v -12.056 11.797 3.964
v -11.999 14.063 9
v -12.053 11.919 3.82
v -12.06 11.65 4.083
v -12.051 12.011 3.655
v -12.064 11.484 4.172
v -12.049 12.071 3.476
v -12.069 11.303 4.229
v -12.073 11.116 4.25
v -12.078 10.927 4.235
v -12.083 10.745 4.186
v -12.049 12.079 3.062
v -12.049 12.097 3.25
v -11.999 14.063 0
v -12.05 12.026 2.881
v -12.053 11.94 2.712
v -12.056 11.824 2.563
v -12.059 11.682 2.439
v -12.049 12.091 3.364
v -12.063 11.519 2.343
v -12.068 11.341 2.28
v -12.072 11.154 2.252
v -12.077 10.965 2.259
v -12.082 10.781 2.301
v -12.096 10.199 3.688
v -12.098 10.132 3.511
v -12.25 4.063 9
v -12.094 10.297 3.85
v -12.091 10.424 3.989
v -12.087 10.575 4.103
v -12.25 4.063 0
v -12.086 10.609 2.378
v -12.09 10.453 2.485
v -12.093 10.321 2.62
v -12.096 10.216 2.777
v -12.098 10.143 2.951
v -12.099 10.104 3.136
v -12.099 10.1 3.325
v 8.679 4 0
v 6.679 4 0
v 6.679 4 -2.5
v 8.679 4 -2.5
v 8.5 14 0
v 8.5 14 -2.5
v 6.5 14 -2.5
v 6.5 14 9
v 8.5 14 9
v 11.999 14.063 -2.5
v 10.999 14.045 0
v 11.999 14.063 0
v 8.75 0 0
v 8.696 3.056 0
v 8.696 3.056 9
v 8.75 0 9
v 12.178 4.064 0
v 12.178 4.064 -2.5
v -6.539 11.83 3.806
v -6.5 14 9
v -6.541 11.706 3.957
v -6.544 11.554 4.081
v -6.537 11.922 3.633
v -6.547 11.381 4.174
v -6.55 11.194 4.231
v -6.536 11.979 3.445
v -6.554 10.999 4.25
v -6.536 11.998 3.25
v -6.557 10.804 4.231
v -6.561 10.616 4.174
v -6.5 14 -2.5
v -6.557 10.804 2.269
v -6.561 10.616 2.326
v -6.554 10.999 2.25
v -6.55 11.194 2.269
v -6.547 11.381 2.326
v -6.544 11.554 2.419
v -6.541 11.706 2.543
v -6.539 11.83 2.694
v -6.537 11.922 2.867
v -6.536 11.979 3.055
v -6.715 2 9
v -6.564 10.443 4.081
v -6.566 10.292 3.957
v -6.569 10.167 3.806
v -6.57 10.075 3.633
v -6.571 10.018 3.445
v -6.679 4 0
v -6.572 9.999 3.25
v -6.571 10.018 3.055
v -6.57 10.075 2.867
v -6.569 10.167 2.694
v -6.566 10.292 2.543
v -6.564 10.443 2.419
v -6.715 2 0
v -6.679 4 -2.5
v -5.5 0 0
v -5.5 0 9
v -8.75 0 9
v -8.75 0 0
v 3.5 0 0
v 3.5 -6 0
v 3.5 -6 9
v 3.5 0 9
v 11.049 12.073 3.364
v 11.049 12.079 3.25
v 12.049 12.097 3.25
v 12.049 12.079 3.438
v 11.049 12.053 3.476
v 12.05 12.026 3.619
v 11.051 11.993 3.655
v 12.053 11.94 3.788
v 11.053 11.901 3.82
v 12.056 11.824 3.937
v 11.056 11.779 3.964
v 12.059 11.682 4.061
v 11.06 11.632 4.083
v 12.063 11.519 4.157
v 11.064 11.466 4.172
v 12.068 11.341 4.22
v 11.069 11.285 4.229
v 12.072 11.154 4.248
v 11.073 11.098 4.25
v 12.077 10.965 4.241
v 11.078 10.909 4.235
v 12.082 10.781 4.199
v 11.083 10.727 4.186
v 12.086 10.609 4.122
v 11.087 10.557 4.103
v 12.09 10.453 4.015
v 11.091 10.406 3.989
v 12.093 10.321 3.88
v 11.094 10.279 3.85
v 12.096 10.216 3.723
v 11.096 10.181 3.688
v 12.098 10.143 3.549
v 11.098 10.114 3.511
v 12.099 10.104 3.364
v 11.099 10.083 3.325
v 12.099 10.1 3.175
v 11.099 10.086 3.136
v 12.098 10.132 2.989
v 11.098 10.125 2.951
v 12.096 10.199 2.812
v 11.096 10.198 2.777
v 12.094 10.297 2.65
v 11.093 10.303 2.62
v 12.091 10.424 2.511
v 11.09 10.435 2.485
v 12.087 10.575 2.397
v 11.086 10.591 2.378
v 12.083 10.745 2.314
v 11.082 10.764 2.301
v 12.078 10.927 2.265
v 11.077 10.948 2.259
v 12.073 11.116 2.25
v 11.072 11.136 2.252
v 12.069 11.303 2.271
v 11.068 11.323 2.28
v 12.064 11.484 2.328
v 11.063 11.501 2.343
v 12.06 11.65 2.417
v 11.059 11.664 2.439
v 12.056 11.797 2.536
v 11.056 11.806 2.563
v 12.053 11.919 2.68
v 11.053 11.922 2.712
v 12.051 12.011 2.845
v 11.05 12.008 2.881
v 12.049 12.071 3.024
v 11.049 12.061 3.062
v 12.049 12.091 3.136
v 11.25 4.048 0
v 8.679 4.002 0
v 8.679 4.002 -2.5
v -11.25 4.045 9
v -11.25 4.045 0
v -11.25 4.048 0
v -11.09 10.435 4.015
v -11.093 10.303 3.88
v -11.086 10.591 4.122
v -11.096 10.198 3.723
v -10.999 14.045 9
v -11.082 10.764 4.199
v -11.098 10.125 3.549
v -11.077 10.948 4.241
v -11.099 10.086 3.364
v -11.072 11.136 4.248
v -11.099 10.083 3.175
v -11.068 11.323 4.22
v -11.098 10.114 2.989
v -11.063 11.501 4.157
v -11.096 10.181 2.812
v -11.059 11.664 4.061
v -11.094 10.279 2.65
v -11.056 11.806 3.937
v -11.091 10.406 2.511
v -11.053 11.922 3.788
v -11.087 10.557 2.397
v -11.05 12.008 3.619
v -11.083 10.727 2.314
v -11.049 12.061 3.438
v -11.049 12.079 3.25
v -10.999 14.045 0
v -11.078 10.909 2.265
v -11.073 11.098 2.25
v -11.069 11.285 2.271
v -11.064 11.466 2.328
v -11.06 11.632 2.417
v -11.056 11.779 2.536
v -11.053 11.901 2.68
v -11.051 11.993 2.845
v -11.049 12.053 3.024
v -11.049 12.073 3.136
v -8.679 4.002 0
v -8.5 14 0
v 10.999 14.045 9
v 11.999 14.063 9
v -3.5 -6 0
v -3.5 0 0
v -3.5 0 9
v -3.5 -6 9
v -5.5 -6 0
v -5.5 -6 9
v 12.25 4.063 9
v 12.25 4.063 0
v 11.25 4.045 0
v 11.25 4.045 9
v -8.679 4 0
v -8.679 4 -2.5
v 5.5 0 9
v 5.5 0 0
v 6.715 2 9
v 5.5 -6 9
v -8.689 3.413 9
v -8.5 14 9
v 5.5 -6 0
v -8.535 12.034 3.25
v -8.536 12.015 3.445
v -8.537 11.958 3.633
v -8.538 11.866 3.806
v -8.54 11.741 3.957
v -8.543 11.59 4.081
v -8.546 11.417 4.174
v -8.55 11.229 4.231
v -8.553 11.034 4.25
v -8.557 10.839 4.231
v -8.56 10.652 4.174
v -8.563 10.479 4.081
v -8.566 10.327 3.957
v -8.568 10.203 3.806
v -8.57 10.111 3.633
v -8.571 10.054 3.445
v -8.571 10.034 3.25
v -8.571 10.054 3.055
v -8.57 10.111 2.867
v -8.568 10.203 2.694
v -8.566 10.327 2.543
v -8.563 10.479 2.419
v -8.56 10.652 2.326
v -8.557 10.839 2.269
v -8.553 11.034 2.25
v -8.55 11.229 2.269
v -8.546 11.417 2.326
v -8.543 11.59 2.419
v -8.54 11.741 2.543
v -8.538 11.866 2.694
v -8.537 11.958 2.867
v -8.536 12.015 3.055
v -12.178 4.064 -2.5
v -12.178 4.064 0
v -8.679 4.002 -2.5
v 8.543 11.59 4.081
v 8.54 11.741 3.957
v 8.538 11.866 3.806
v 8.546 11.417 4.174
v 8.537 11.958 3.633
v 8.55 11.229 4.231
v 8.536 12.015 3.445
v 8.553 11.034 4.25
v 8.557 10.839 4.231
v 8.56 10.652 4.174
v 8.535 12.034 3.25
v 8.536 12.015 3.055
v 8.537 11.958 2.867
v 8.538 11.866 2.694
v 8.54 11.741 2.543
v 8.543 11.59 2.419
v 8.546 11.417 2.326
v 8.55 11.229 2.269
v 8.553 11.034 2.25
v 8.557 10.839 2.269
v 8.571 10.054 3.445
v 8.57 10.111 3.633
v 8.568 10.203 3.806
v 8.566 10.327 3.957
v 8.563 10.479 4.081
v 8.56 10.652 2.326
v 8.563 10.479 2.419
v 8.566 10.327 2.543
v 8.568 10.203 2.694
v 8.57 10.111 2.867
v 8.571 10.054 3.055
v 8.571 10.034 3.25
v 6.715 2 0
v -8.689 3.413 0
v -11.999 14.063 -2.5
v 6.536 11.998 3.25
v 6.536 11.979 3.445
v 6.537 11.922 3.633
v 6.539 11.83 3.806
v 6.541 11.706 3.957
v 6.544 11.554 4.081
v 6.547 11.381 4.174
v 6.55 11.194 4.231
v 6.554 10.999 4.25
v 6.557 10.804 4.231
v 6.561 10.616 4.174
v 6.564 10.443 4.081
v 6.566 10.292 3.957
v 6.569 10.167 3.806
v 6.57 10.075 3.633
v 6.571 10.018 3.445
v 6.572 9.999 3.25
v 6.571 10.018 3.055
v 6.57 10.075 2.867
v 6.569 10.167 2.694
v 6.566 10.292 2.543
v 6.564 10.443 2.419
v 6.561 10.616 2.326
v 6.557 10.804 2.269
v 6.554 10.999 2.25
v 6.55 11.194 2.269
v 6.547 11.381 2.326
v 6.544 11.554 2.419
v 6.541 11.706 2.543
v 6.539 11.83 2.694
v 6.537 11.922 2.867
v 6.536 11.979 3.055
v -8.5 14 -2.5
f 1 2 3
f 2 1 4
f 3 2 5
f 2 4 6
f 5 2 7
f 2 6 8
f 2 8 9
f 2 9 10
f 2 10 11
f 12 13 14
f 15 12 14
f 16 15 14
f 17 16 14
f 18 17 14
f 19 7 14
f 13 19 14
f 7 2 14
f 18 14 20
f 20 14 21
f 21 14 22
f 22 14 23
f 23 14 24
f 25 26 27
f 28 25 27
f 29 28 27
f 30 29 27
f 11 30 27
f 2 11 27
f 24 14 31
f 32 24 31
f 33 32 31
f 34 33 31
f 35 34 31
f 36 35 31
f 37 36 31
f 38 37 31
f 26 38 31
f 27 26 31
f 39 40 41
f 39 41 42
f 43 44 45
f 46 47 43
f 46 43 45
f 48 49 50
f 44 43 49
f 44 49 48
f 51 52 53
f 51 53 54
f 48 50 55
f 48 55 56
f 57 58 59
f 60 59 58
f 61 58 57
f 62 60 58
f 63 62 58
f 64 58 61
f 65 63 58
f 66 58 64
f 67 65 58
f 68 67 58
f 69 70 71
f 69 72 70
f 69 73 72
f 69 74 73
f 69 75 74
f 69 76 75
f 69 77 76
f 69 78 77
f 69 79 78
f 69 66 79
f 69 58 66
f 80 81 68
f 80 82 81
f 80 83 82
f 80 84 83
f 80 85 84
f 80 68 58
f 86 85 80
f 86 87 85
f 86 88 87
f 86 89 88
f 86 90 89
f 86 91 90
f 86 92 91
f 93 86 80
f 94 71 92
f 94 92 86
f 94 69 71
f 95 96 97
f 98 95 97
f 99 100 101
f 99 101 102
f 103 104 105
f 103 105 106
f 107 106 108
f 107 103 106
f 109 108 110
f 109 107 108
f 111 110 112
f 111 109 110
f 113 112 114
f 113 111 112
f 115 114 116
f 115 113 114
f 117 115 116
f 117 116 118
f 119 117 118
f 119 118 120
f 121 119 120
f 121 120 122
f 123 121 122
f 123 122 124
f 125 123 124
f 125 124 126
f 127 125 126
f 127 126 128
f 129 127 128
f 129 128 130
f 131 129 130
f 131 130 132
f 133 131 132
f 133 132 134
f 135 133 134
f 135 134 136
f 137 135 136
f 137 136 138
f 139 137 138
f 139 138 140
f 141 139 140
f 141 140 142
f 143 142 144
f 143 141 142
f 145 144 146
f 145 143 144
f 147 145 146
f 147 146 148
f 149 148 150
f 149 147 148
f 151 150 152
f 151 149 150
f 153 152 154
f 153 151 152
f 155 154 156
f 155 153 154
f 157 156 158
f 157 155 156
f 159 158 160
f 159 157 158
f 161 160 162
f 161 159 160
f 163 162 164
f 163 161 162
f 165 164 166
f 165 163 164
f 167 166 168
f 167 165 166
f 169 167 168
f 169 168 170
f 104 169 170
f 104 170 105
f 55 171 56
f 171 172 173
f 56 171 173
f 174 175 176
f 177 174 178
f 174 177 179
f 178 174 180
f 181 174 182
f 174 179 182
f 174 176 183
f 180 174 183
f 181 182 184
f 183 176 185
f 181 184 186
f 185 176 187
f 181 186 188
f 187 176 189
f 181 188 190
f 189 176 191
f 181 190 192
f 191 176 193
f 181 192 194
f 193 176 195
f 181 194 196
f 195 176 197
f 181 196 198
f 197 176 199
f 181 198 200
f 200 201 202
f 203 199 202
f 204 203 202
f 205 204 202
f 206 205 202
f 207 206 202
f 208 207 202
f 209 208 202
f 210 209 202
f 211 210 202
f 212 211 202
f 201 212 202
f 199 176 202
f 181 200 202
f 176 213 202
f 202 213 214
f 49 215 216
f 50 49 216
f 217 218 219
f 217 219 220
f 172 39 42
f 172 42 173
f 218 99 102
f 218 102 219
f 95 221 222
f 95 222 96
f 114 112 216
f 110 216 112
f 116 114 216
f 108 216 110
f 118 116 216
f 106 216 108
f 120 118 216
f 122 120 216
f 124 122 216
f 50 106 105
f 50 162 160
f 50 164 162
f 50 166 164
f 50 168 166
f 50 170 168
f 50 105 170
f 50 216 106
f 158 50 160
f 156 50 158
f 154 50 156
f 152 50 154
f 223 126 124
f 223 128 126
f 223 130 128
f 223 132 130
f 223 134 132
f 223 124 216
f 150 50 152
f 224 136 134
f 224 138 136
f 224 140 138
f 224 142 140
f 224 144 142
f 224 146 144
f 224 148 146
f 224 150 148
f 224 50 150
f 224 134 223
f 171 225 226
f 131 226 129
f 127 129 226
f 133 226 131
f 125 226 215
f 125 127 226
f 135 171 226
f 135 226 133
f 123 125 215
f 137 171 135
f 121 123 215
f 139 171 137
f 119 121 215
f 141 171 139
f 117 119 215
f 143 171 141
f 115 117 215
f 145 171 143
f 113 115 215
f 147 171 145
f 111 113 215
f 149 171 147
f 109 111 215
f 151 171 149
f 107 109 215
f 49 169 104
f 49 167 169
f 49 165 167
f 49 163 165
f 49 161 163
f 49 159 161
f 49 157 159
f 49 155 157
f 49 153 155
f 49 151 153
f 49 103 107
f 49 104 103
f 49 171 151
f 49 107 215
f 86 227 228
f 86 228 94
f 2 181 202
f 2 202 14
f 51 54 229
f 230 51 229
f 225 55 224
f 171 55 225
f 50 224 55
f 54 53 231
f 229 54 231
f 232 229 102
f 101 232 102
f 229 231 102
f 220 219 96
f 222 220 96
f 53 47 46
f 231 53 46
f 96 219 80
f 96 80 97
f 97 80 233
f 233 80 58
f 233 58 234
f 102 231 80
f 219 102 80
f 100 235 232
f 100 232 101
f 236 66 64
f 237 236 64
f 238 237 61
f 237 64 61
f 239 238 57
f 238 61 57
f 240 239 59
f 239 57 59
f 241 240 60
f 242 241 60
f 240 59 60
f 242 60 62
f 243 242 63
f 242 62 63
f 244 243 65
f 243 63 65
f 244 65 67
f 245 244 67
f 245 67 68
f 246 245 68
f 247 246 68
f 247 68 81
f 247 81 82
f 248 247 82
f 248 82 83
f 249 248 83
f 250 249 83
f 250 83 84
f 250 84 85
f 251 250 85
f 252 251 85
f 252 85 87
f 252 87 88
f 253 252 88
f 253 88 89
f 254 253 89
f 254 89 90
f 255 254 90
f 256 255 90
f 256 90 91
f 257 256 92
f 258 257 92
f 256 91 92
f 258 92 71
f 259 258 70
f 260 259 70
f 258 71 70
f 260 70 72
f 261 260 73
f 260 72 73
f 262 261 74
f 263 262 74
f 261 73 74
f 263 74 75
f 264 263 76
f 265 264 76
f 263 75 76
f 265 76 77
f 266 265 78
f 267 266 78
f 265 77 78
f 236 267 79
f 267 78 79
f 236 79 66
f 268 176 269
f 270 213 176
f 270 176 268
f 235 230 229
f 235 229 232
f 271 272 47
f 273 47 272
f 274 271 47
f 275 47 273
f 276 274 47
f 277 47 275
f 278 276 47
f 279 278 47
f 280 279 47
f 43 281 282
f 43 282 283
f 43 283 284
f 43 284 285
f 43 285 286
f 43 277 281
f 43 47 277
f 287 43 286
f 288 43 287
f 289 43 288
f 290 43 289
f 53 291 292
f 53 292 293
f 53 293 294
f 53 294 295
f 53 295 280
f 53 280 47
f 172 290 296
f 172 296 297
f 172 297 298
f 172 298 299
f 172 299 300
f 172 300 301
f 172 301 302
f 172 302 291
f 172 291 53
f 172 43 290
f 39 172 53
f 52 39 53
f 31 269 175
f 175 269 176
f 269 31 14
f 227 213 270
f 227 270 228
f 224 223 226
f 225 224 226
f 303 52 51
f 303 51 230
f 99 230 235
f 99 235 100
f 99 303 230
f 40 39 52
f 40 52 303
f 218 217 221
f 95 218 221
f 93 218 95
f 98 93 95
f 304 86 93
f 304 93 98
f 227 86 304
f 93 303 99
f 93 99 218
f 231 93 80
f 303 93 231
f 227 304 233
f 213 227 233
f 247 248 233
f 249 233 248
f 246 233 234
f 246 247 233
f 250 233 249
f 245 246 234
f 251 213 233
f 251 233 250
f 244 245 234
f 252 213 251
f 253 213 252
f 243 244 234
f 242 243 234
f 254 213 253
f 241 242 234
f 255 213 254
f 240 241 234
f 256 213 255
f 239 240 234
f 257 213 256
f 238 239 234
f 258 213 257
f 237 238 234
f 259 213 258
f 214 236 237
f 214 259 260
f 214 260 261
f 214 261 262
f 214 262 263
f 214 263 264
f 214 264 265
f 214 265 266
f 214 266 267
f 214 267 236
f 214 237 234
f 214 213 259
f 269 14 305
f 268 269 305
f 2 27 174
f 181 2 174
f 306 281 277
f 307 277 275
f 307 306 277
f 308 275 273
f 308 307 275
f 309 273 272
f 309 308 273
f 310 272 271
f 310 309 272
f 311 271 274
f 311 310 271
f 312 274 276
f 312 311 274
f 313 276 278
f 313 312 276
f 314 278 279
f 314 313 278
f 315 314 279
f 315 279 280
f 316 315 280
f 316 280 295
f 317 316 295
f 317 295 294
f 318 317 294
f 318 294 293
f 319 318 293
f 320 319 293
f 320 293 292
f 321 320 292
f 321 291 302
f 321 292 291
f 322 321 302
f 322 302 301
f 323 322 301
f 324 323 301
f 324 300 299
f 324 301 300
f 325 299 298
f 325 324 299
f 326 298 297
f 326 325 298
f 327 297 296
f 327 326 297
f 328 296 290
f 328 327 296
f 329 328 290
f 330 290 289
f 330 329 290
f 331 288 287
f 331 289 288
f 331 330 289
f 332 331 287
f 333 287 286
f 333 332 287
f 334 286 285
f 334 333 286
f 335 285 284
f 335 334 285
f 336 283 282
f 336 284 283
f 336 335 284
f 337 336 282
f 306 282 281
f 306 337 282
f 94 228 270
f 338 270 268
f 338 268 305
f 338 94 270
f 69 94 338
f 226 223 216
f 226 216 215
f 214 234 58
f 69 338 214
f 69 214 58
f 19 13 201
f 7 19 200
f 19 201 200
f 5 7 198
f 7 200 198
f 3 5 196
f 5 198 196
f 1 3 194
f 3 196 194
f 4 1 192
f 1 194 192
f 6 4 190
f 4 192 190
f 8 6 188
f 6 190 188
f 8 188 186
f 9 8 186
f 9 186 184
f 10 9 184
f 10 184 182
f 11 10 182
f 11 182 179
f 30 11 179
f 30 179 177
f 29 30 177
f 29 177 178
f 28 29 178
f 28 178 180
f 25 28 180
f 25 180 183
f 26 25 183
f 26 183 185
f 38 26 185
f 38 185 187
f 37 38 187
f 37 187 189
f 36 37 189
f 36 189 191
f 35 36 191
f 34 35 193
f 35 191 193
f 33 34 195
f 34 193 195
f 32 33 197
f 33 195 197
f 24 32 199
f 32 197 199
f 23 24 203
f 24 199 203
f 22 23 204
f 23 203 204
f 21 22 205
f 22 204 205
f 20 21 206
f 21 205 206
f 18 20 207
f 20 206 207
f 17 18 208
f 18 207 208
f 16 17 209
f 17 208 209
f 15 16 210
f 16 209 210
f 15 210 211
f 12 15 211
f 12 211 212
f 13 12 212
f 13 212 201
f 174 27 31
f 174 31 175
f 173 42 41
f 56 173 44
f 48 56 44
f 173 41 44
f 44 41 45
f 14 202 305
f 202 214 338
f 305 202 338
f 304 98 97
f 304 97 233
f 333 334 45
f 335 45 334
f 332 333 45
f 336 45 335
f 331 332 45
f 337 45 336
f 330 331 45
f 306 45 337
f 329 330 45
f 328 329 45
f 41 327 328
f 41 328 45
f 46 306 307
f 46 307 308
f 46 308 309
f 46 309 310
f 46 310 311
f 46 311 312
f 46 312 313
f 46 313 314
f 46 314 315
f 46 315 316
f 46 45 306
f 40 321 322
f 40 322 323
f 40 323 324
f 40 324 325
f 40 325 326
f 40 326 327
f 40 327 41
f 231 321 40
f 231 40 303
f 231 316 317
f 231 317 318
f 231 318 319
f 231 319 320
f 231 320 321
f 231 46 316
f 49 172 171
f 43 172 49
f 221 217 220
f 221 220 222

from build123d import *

# Parameters (mm, degrees)
BOSS_EXTRUDE1_DEPTH = 9
BOSS_EXTRUDE2_DEPTH = 2.5
SKETCH5_W           = 2.5
SKETCH5_H           = 10
BOSS_EXTRUDE3_DEPTH = 3.5
BOSS_EXTRUDE4_DEPTH = 9
SKETCH7_R           = 1
CUT_EXTRUDE2_DEPTH  = 9


with BuildPart() as part:
    # Sketch1 → Boss-Extrude1 (new body)
    with BuildSketch(Plane.XY):
        Polygon((-8.689412161, 3.413307669), (-8.5, 14), (-6.5, 14), (-6.714698402, 2), (6.714698402, 2), (6.5, 14), (8.5, 14), (8.695807241, 3.055871556), (8.750481469, 0), (5.5, 0), (5.5, -6), (3.5, -6), (3.5, 0), (-3.5, 0), (-3.5, -6), (-5.5, -6), (-5.5, 0), (-8.750481469, 0), align=None)
    extrude(amount=BOSS_EXTRUDE1_DEPTH)

    # Sketch3 → Boss-Extrude2 (add)
    with BuildSketch(Plane(origin=(0, 0, 0), x_dir=(-1, 0, 0), z_dir=(0, 0, -1))):
        Polygon((-8.5, 14), (-6.5, 14), (-6.678915335, 4), (-8.678915335, 4), align=None)
        Polygon((6.5, 14), (8.5, 14), (8.678915335, 4), (6.678915335, 4), align=None)
    extrude(amount=BOSS_EXTRUDE2_DEPTH)

    # Sketch5 → Boss-Extrude3 (add)
    with BuildSketch(Plane(origin=(8.747681276, 0.156509433, 0), x_dir=(0, 0, -1), z_dir=(0.9998399849293209, 0.01788867061956491, 0))):
        with Locations((1.25, 8.845706089)):
            Rectangle(SKETCH5_W, SKETCH5_H)
    boss_extrude3 = extrude(amount=BOSS_EXTRUDE3_DEPTH)

    # Sketch6 → Boss-Extrude4 (add)
    with BuildSketch(Plane.XY):
        Polygon((10.999439947, 14.044718814), (11.999439947, 14.062610347), (12.249921417, 4.062610347), (11.249921417, 4.044718814), align=None)
    boss_extrude4 = extrude(amount=BOSS_EXTRUDE4_DEPTH)

    # Mirror2: Boss-Extrude3, Boss-Extrude4 across plane
    add(boss_extrude3.mirror(Plane(origin=(0, 0, 0), x_dir=(0, 0, 1), z_dir=(1, 0, 0))))
    add(boss_extrude4.mirror(Plane(origin=(0, 0, 0), x_dir=(0, 0, 1), z_dir=(1, 0, 0))))

    # Sketch7 → Cut-Extrude2 (cut)
    with BuildSketch(Plane(origin=(-6.748321285, 0.120737817, 0), x_dir=(0, 0, -1), z_dir=(0.9998399849293208, -0.017888670619572784, 0))):
        with Locations(Location((-3.25, 10.879562942, 0), (0, 0, 90))):
            Circle(SKETCH7_R)
    cut_extrude2 = extrude(amount=-CUT_EXTRUDE2_DEPTH, mode=Mode.SUBTRACT)

    # Mirror3: Cut-Extrude2 across plane
    add(cut_extrude2.mirror(Plane(origin=(0, 0, 0), x_dir=(0, 0, 1), z_dir=(1, 0, 0))), mode=Mode.SUBTRACT)


solid = part.part
